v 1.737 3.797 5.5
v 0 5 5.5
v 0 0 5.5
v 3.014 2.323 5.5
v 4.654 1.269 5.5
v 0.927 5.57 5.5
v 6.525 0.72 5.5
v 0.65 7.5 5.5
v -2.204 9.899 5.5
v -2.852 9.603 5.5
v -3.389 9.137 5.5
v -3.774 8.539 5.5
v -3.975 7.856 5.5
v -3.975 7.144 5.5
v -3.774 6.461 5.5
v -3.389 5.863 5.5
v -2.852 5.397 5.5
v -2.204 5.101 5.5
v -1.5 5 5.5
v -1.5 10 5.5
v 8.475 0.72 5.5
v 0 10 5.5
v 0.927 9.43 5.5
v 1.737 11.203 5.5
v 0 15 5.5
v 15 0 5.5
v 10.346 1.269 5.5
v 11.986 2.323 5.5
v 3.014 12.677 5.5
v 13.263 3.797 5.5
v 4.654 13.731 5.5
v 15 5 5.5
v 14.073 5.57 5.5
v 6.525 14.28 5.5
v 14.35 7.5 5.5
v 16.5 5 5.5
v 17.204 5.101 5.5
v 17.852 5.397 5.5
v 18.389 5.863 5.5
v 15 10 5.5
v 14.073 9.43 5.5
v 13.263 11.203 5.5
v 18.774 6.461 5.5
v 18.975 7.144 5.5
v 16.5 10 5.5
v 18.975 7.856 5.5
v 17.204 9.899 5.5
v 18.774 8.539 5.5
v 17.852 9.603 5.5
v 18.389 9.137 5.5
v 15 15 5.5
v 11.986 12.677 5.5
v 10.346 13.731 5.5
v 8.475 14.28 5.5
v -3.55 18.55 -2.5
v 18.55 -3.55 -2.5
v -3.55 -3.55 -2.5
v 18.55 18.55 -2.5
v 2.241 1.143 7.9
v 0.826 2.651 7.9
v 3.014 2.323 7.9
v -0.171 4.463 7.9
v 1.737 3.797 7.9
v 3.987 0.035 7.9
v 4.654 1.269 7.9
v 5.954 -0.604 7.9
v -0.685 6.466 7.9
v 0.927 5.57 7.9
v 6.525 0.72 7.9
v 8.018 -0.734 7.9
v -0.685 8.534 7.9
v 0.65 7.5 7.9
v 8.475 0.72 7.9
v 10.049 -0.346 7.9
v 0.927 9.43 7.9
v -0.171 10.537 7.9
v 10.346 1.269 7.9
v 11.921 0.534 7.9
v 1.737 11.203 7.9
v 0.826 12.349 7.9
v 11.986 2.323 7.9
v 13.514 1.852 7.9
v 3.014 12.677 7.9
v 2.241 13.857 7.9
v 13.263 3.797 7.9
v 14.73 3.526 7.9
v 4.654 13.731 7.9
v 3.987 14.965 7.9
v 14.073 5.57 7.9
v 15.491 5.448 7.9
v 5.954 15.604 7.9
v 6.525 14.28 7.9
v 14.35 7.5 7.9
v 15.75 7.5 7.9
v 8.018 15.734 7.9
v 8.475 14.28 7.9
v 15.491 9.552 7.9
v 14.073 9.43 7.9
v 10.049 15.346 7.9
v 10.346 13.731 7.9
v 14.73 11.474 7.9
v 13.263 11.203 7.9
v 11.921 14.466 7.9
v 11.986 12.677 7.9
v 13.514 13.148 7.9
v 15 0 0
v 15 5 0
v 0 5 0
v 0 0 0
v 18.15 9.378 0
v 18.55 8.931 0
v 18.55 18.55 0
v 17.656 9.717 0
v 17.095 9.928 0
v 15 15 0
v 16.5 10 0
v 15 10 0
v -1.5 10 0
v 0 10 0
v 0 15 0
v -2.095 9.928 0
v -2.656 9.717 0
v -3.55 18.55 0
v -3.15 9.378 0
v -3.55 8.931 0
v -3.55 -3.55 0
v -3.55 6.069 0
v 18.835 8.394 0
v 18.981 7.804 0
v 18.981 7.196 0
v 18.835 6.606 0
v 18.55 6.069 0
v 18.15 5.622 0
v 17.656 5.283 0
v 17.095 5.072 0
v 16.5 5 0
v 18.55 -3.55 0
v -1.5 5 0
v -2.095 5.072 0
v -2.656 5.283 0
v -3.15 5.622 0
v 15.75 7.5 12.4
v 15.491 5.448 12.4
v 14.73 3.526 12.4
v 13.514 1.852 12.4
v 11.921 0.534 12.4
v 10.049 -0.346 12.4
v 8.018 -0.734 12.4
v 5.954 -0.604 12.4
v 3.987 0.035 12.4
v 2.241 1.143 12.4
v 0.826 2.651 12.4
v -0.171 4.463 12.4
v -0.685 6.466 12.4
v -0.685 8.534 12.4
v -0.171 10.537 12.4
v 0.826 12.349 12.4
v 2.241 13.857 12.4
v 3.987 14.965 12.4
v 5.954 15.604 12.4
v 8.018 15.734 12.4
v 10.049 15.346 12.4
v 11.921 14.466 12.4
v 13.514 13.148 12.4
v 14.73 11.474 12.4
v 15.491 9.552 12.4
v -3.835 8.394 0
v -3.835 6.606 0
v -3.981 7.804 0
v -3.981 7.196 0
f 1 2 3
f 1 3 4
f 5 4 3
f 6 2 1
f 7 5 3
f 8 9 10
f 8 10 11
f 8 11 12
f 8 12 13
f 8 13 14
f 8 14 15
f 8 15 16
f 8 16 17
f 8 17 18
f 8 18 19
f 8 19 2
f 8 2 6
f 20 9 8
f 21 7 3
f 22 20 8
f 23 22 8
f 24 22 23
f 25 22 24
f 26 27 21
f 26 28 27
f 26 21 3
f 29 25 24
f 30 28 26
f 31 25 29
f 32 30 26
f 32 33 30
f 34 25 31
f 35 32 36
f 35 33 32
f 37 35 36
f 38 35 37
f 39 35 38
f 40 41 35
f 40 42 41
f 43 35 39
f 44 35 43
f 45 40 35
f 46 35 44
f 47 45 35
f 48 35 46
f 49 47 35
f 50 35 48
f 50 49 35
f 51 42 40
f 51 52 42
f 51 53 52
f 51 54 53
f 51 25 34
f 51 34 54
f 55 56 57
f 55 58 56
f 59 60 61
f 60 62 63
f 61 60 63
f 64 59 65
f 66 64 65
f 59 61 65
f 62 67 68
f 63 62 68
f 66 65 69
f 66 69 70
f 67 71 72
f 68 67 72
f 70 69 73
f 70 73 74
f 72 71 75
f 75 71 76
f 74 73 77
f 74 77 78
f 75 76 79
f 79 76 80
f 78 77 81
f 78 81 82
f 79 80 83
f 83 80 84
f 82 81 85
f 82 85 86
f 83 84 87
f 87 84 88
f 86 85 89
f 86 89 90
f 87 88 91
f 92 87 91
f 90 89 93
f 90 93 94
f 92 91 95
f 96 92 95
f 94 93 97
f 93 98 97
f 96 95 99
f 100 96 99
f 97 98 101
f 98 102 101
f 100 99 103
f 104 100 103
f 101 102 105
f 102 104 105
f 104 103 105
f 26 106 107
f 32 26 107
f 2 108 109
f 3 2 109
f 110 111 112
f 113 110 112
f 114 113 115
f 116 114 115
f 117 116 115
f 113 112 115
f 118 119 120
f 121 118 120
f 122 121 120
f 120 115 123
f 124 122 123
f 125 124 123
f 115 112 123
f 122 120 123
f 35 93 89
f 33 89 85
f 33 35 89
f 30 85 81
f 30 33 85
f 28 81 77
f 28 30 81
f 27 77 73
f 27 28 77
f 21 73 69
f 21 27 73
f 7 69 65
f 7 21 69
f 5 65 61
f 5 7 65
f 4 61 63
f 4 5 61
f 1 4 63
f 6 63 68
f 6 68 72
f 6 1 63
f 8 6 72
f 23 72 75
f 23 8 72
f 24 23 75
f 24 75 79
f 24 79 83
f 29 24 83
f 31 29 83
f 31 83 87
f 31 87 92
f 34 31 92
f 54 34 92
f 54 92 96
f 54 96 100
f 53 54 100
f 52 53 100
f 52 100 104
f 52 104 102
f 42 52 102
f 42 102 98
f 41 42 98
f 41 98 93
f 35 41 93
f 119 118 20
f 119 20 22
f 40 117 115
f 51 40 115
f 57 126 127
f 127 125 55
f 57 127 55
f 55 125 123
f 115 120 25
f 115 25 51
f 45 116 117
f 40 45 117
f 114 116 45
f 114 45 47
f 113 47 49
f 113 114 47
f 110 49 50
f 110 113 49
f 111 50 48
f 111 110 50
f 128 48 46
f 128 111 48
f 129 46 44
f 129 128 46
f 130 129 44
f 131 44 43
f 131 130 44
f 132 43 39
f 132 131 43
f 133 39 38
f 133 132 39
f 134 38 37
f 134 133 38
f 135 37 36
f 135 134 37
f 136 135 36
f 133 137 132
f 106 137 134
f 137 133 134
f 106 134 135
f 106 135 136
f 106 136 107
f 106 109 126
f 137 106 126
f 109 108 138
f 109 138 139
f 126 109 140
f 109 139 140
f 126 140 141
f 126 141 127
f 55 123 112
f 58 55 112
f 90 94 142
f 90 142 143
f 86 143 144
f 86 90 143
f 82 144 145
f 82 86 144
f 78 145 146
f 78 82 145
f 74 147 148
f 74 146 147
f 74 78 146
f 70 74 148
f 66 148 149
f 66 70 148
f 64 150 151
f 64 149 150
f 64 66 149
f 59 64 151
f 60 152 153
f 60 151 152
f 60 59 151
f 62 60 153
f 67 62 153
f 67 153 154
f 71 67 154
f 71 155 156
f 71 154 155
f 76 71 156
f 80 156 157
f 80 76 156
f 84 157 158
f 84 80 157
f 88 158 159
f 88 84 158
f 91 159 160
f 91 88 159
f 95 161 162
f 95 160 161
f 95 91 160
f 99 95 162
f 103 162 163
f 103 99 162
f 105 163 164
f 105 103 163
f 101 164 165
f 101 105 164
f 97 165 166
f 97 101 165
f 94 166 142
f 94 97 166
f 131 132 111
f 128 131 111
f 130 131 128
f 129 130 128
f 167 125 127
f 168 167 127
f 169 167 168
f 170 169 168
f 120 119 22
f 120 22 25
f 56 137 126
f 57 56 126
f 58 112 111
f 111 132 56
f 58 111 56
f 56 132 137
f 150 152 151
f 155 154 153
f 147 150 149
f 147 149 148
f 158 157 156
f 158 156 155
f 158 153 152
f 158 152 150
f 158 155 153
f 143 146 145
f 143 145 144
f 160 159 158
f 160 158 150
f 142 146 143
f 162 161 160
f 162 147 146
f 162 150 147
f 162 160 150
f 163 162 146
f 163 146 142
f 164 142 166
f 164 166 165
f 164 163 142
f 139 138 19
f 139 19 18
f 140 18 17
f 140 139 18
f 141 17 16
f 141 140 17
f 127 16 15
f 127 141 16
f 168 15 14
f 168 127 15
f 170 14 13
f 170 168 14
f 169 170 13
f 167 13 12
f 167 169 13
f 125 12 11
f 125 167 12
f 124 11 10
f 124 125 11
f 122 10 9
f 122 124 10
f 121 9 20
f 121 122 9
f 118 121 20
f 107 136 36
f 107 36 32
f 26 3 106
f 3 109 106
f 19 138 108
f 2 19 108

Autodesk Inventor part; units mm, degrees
ref_plane "YZ Plane" through (0, 0, 0) normal (1, 0, 0) x (0, 1, 0)
ref_plane "XZ Plane" through (0, 0, 0) normal (0, 1, 0) x (-1, 0, 0)
ref_plane "XY Plane" through (0, 0, 0) normal (0, 0, 1) x (1, 0, 0)
sketch "Sketch1" plane through (0, 0, 0) normal (0, 0, 1) x (1, 0, 0)
  line L0 (0, 0) -> (15, 0) construction
  line L1 (15, 0) -> (15, 15) construction
  line L2 (15, 15) -> (0, 15) construction
  line L3 (0, 15) -> (0, 0) construction
  circle A0 centre (-1.5, 7.5) radius 2.5 construction
  circle A1 centre (16.5, 7.5) radius 2.5 construction
  line L4 (0, 15) -> (15, 15)
  line L5 (0, 0) -> (15, 0)
  arc A2 (-1.5, 10) -> (-1.5, 5) centre (-1.5, 7.5) ccw
  arc A3 (16.5, 5) -> (16.5, 10) centre (16.5, 7.5) ccw
  line L6 (-1.5, 10) -> (0, 10)
  line L7 (-1.5, 5) -> (0, 5)
  line L8 (16.5, 10) -> (15, 10)
  line L9 (16.5, 5) -> (15, 5)
  line L10 (15, 10) -> (15, 15)
  line L11 (0, 10) -> (0, 15)
  line L12 (0, 5) -> (0, 0)
  line L13 (15, 0) -> (15, 5)
  dimension "d0" = 15
  dimension "d1" = 15
  dimension "d2" = 5
  dimension "d3" = 5
extrude "Extrusion1" add sketch "Sketch1" along normal blind 5.5
sketch "Sketch2" plane through (0, 0, 5.5) normal (0, 0, 1) x (1, 0, 0)
  line L0 (0, 5) -> (-1.5, 5) projected
  line L1 (7.5, 18.6806) -> (7.5, -6.0082)
  line L2 (-7.546, 7.5) -> (23.0032, 7.5)
  circle A0 centre (7.5, 7.5) radius 6.85
  dimension "d6" = 13.7
extrude "Extrusion2" add sketch "Sketch2" along normal blind 2.4
sketch "Sketch3" plane through (7.5, 7.5, 7.9) normal (0, 0, 1) x (1, 0, 0)
  circle A0 centre (0, 0) radius 6.85 projected
  circle A1 centre (0, 0) radius 8.25
  point P0 (-7.5, -7.5)
  dimension "d9" = 16.5
extrude "Extrusion3" add sketch "Sketch3" along normal blind 4.5 contours A0 | A1
sketch "Sketch4" plane through (0, 0, 0) normal (0, 0, -1) x (-1, 0, 0)
  line L0 (-15, 0) -> (-15, 5) projected
  line L1 (-7.5, 18.462) -> (-7.5, -5.0214)
  line L2 (-22.4523, 7.5) -> (8.5989, 7.5)
  circle A0 centre (-7.5, 7.5) radius 11.05 construction
  line L3 (-18.55, -3.55) -> (3.55, -3.55)
  line L4 (3.55, -3.55) -> (3.55, 18.55)
  line L5 (3.55, 18.55) -> (-18.55, 18.55)
  line L6 (-18.55, 18.55) -> (-18.55, -3.55)
  dimension "d12" = 22.1
extrude "Extrusion4" add sketch "Sketch4" along normal blind 2.5
properties part number "camera"
